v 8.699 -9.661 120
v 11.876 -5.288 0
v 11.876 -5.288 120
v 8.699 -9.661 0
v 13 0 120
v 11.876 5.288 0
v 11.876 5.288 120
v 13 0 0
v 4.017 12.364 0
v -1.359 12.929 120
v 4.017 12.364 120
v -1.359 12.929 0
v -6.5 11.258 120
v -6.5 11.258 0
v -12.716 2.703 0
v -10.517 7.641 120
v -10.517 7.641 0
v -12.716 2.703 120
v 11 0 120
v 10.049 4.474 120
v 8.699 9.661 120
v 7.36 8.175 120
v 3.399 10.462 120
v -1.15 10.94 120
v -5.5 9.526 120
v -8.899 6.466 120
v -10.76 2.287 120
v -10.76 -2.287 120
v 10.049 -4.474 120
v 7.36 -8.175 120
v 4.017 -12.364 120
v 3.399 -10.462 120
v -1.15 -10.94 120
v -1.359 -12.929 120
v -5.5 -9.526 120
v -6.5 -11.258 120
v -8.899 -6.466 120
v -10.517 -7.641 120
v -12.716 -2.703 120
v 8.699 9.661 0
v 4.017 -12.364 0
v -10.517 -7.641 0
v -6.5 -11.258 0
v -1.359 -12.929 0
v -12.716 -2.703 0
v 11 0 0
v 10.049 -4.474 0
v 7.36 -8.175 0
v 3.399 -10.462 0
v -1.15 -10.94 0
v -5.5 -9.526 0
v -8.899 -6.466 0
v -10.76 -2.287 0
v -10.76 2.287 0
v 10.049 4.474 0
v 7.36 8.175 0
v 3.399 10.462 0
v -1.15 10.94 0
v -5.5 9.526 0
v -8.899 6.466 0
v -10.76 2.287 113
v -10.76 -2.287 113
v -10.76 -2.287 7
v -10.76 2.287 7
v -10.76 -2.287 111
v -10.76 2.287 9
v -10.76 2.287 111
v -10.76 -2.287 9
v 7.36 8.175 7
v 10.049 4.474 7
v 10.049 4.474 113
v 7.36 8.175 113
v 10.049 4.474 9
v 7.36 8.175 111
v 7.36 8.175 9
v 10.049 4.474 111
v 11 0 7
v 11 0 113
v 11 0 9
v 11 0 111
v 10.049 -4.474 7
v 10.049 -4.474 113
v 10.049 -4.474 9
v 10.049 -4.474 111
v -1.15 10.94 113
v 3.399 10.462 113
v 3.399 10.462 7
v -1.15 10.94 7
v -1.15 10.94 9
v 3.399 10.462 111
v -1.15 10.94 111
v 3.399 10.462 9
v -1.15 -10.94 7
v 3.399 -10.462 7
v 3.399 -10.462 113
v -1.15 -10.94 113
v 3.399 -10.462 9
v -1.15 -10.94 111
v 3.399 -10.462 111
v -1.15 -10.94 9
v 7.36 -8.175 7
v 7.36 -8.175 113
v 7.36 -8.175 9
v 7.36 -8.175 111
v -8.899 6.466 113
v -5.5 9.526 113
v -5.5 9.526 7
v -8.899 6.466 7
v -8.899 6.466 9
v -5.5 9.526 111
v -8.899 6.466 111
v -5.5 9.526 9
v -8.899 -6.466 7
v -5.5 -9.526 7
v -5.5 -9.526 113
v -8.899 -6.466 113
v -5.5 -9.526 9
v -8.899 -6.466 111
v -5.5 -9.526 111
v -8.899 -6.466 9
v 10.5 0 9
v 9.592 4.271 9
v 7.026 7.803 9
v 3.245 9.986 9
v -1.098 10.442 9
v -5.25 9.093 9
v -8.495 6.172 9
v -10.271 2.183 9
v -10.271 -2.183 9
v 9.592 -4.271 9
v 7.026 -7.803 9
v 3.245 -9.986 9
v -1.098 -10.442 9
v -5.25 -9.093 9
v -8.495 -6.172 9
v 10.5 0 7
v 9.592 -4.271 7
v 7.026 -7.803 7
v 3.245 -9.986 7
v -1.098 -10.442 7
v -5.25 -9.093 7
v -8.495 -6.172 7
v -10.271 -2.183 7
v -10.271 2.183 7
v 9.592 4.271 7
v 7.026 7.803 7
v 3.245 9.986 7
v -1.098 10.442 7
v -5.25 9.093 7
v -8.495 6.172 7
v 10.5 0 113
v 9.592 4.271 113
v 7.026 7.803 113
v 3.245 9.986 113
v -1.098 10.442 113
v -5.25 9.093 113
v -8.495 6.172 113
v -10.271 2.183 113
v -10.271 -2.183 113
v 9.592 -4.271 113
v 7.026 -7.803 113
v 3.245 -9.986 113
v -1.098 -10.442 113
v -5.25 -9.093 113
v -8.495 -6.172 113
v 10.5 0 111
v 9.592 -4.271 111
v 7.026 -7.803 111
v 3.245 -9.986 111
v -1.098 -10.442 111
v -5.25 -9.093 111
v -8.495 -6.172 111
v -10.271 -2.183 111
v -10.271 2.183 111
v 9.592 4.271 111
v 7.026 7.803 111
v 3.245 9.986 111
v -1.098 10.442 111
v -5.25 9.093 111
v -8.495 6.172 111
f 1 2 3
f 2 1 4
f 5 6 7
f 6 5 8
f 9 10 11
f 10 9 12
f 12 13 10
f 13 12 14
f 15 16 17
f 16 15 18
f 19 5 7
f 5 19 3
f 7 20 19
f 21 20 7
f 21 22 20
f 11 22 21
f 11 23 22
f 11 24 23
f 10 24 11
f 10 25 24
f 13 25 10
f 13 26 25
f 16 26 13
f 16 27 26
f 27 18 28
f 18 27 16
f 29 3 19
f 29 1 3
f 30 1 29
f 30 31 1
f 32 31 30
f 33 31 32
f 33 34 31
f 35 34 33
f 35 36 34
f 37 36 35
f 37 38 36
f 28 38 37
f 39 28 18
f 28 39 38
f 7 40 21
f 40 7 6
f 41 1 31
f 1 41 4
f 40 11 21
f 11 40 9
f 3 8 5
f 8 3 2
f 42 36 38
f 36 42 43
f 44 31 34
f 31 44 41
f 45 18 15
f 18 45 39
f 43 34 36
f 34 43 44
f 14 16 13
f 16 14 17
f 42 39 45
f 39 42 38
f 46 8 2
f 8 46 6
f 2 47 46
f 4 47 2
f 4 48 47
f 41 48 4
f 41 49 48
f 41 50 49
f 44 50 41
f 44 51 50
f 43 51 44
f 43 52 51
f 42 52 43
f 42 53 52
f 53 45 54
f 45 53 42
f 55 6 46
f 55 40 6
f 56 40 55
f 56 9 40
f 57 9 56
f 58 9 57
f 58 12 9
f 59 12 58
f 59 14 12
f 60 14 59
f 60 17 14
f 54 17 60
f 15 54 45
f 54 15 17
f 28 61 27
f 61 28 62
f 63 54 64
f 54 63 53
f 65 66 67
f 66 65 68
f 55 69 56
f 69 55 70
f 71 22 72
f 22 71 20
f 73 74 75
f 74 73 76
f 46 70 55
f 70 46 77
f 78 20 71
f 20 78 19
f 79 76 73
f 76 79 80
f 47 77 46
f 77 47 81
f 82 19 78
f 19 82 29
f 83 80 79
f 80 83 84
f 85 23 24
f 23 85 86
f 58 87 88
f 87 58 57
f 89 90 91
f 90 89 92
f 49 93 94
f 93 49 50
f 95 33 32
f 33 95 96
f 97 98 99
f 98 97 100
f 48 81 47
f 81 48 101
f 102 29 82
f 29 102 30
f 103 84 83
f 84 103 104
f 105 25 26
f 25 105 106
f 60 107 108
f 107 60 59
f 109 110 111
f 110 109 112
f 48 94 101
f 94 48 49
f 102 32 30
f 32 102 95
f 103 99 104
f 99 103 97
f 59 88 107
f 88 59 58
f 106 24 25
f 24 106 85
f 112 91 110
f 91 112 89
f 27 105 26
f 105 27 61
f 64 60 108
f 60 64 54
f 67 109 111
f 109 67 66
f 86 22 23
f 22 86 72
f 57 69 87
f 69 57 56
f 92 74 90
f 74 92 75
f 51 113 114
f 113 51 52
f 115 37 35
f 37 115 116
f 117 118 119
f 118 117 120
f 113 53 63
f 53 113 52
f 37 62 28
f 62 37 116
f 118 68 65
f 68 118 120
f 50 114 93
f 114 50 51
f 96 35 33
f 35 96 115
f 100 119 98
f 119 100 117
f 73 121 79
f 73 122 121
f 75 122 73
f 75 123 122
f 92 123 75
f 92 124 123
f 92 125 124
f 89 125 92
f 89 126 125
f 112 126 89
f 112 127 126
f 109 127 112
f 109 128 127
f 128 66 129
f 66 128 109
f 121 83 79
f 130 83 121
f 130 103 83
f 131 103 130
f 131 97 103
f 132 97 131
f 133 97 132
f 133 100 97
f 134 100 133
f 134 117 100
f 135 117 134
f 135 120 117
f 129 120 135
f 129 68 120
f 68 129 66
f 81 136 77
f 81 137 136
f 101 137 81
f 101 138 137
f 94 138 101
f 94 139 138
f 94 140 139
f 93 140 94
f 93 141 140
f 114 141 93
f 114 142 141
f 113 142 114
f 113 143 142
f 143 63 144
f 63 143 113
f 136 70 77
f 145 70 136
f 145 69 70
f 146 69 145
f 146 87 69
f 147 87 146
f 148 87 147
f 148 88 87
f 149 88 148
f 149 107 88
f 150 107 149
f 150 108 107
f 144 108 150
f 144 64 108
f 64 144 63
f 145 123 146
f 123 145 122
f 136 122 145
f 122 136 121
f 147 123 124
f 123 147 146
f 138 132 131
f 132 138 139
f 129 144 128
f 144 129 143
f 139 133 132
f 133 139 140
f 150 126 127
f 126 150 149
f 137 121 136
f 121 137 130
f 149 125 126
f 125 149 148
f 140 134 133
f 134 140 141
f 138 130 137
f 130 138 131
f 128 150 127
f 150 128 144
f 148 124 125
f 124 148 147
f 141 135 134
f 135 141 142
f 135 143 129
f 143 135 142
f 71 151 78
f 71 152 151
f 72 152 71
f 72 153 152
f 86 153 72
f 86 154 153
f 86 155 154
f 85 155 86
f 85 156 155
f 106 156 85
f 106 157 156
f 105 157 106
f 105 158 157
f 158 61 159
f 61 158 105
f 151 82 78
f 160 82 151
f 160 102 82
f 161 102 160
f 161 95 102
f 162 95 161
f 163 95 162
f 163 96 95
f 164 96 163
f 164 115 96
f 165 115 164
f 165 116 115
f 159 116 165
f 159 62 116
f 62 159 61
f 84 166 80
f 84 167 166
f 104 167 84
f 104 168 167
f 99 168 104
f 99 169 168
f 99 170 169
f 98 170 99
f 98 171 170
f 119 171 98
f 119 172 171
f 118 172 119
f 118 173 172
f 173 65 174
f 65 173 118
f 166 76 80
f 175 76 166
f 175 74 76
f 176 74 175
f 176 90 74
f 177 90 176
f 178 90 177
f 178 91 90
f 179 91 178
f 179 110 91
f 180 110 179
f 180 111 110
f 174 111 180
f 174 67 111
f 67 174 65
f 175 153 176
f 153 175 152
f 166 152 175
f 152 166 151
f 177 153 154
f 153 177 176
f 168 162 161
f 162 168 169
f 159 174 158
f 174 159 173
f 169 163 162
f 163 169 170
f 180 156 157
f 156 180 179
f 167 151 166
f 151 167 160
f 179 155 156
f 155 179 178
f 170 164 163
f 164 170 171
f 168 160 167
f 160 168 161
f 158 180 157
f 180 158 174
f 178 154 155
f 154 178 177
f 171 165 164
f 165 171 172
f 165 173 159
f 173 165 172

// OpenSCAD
$fn = 15;

roller_width = 120;
bearing_width = 7;
bearing_inner_diameter = 8;
bearing_outer_diameter = 22;
roller_thickness = 4;
inner_flange_width = 2;
inner_flange_thickness = 1;


// roller
difference() {
    cylinder(roller_width, d= bearing_outer_diameter + roller_thickness);
    cylinder(roller_width, d= bearing_outer_diameter                   );
}


// inner bearing flange
translate([0,0,bearing_width]) {
    difference() {
        cylinder(inner_flange_width, d = bearing_outer_diameter + roller_thickness      );
        cylinder(inner_flange_width, d = bearing_outer_diameter - inner_flange_thickness);
    }
}

translate([0,0,roller_width - (bearing_width + inner_flange_width)]) {
    difference() {
        cylinder(inner_flange_width, d = bearing_outer_diameter + roller_thickness      );
        cylinder(inner_flange_width, d = bearing_outer_diameter - inner_flange_thickness);
    }
}
